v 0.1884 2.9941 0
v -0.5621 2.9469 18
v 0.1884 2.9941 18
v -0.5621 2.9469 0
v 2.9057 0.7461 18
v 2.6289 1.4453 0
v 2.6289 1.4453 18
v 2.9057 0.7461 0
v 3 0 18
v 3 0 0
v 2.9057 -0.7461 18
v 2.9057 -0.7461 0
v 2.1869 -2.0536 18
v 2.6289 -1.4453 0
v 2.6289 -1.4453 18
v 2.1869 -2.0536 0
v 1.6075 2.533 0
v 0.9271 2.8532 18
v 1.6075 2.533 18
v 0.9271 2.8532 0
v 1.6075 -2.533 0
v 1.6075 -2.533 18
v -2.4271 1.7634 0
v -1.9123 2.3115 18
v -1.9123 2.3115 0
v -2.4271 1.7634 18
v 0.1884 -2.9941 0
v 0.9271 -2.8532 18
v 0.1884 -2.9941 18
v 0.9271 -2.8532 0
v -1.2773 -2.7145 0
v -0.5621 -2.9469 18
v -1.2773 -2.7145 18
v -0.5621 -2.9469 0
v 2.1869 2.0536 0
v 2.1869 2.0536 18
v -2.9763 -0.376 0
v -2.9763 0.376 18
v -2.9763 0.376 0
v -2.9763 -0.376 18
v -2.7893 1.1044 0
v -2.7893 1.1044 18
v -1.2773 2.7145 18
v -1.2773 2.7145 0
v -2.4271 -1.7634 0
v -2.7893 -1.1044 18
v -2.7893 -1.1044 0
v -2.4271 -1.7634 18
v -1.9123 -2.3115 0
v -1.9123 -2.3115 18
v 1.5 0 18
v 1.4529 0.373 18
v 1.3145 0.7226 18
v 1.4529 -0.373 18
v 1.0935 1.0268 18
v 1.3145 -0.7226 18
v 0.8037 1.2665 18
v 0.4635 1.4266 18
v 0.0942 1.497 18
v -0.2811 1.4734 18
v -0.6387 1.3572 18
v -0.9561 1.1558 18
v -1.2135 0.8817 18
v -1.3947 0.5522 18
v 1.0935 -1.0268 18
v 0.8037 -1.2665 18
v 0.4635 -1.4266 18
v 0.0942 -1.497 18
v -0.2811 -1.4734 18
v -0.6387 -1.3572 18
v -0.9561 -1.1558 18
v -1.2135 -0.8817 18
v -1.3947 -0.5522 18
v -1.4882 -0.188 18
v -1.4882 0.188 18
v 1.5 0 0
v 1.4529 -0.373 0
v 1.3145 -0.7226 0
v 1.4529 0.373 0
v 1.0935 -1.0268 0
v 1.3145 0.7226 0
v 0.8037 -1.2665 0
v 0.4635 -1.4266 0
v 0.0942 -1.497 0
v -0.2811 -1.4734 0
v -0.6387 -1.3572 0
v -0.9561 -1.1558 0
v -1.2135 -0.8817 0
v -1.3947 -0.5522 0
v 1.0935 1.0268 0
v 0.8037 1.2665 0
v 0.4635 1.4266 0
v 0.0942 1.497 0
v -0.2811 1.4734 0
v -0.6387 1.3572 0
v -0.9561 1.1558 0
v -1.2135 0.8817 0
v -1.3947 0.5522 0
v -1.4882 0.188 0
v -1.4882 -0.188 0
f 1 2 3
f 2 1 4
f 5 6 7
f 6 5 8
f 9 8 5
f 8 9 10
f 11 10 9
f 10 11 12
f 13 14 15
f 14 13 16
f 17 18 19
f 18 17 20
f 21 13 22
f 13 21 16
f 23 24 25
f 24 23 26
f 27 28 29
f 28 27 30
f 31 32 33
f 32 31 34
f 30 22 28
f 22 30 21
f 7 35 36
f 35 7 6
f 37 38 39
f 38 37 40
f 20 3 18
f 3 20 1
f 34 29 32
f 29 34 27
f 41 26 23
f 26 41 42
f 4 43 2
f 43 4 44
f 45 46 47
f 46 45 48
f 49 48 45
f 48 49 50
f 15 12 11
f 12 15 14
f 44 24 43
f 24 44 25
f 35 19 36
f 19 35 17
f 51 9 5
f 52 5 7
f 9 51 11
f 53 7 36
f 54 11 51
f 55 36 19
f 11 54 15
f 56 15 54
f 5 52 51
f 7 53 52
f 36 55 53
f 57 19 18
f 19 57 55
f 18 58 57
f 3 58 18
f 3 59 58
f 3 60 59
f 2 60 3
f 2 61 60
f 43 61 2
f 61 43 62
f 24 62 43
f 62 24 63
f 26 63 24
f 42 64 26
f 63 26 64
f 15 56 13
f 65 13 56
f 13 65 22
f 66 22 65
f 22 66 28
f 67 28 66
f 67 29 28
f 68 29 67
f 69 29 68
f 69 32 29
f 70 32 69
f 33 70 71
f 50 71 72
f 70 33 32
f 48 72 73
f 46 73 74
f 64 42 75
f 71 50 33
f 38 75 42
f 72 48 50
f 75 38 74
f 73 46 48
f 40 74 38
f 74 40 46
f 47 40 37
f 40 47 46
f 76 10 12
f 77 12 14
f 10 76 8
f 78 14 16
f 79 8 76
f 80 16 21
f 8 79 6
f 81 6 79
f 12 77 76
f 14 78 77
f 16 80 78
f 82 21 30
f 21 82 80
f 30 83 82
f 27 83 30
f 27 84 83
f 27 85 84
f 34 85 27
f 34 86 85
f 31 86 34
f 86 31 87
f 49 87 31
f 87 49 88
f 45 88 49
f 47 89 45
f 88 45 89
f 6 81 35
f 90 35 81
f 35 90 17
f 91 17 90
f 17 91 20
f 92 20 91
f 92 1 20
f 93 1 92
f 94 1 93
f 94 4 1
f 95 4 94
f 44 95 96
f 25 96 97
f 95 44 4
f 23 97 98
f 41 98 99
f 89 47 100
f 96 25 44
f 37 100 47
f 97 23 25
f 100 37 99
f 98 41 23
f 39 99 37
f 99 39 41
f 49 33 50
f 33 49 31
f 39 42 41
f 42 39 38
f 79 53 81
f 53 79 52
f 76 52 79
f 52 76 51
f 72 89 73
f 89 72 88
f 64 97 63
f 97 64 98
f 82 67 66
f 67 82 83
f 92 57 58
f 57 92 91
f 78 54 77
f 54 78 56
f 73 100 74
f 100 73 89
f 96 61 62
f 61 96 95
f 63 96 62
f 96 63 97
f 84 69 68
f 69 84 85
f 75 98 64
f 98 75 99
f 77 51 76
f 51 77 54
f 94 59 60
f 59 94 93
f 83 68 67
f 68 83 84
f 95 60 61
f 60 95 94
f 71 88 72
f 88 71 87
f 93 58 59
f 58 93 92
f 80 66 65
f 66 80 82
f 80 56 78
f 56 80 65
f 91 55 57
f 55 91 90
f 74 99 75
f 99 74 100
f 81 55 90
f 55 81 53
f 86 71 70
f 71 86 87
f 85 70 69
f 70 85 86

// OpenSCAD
inner_dia = 3.0;
outer_dia = inner_dia + 2*1.5;
height    = 18.0;
eps       = 0.1;

module standoff() {
    difference() {
        cylinder(h=height, d=outer_dia);
        translate([0, 0, -eps]) cylinder(h=height+2*eps, d=inner_dia);
    }
}

module standoff_group() {
    standoff();
}

standoff_group($fn=25);
